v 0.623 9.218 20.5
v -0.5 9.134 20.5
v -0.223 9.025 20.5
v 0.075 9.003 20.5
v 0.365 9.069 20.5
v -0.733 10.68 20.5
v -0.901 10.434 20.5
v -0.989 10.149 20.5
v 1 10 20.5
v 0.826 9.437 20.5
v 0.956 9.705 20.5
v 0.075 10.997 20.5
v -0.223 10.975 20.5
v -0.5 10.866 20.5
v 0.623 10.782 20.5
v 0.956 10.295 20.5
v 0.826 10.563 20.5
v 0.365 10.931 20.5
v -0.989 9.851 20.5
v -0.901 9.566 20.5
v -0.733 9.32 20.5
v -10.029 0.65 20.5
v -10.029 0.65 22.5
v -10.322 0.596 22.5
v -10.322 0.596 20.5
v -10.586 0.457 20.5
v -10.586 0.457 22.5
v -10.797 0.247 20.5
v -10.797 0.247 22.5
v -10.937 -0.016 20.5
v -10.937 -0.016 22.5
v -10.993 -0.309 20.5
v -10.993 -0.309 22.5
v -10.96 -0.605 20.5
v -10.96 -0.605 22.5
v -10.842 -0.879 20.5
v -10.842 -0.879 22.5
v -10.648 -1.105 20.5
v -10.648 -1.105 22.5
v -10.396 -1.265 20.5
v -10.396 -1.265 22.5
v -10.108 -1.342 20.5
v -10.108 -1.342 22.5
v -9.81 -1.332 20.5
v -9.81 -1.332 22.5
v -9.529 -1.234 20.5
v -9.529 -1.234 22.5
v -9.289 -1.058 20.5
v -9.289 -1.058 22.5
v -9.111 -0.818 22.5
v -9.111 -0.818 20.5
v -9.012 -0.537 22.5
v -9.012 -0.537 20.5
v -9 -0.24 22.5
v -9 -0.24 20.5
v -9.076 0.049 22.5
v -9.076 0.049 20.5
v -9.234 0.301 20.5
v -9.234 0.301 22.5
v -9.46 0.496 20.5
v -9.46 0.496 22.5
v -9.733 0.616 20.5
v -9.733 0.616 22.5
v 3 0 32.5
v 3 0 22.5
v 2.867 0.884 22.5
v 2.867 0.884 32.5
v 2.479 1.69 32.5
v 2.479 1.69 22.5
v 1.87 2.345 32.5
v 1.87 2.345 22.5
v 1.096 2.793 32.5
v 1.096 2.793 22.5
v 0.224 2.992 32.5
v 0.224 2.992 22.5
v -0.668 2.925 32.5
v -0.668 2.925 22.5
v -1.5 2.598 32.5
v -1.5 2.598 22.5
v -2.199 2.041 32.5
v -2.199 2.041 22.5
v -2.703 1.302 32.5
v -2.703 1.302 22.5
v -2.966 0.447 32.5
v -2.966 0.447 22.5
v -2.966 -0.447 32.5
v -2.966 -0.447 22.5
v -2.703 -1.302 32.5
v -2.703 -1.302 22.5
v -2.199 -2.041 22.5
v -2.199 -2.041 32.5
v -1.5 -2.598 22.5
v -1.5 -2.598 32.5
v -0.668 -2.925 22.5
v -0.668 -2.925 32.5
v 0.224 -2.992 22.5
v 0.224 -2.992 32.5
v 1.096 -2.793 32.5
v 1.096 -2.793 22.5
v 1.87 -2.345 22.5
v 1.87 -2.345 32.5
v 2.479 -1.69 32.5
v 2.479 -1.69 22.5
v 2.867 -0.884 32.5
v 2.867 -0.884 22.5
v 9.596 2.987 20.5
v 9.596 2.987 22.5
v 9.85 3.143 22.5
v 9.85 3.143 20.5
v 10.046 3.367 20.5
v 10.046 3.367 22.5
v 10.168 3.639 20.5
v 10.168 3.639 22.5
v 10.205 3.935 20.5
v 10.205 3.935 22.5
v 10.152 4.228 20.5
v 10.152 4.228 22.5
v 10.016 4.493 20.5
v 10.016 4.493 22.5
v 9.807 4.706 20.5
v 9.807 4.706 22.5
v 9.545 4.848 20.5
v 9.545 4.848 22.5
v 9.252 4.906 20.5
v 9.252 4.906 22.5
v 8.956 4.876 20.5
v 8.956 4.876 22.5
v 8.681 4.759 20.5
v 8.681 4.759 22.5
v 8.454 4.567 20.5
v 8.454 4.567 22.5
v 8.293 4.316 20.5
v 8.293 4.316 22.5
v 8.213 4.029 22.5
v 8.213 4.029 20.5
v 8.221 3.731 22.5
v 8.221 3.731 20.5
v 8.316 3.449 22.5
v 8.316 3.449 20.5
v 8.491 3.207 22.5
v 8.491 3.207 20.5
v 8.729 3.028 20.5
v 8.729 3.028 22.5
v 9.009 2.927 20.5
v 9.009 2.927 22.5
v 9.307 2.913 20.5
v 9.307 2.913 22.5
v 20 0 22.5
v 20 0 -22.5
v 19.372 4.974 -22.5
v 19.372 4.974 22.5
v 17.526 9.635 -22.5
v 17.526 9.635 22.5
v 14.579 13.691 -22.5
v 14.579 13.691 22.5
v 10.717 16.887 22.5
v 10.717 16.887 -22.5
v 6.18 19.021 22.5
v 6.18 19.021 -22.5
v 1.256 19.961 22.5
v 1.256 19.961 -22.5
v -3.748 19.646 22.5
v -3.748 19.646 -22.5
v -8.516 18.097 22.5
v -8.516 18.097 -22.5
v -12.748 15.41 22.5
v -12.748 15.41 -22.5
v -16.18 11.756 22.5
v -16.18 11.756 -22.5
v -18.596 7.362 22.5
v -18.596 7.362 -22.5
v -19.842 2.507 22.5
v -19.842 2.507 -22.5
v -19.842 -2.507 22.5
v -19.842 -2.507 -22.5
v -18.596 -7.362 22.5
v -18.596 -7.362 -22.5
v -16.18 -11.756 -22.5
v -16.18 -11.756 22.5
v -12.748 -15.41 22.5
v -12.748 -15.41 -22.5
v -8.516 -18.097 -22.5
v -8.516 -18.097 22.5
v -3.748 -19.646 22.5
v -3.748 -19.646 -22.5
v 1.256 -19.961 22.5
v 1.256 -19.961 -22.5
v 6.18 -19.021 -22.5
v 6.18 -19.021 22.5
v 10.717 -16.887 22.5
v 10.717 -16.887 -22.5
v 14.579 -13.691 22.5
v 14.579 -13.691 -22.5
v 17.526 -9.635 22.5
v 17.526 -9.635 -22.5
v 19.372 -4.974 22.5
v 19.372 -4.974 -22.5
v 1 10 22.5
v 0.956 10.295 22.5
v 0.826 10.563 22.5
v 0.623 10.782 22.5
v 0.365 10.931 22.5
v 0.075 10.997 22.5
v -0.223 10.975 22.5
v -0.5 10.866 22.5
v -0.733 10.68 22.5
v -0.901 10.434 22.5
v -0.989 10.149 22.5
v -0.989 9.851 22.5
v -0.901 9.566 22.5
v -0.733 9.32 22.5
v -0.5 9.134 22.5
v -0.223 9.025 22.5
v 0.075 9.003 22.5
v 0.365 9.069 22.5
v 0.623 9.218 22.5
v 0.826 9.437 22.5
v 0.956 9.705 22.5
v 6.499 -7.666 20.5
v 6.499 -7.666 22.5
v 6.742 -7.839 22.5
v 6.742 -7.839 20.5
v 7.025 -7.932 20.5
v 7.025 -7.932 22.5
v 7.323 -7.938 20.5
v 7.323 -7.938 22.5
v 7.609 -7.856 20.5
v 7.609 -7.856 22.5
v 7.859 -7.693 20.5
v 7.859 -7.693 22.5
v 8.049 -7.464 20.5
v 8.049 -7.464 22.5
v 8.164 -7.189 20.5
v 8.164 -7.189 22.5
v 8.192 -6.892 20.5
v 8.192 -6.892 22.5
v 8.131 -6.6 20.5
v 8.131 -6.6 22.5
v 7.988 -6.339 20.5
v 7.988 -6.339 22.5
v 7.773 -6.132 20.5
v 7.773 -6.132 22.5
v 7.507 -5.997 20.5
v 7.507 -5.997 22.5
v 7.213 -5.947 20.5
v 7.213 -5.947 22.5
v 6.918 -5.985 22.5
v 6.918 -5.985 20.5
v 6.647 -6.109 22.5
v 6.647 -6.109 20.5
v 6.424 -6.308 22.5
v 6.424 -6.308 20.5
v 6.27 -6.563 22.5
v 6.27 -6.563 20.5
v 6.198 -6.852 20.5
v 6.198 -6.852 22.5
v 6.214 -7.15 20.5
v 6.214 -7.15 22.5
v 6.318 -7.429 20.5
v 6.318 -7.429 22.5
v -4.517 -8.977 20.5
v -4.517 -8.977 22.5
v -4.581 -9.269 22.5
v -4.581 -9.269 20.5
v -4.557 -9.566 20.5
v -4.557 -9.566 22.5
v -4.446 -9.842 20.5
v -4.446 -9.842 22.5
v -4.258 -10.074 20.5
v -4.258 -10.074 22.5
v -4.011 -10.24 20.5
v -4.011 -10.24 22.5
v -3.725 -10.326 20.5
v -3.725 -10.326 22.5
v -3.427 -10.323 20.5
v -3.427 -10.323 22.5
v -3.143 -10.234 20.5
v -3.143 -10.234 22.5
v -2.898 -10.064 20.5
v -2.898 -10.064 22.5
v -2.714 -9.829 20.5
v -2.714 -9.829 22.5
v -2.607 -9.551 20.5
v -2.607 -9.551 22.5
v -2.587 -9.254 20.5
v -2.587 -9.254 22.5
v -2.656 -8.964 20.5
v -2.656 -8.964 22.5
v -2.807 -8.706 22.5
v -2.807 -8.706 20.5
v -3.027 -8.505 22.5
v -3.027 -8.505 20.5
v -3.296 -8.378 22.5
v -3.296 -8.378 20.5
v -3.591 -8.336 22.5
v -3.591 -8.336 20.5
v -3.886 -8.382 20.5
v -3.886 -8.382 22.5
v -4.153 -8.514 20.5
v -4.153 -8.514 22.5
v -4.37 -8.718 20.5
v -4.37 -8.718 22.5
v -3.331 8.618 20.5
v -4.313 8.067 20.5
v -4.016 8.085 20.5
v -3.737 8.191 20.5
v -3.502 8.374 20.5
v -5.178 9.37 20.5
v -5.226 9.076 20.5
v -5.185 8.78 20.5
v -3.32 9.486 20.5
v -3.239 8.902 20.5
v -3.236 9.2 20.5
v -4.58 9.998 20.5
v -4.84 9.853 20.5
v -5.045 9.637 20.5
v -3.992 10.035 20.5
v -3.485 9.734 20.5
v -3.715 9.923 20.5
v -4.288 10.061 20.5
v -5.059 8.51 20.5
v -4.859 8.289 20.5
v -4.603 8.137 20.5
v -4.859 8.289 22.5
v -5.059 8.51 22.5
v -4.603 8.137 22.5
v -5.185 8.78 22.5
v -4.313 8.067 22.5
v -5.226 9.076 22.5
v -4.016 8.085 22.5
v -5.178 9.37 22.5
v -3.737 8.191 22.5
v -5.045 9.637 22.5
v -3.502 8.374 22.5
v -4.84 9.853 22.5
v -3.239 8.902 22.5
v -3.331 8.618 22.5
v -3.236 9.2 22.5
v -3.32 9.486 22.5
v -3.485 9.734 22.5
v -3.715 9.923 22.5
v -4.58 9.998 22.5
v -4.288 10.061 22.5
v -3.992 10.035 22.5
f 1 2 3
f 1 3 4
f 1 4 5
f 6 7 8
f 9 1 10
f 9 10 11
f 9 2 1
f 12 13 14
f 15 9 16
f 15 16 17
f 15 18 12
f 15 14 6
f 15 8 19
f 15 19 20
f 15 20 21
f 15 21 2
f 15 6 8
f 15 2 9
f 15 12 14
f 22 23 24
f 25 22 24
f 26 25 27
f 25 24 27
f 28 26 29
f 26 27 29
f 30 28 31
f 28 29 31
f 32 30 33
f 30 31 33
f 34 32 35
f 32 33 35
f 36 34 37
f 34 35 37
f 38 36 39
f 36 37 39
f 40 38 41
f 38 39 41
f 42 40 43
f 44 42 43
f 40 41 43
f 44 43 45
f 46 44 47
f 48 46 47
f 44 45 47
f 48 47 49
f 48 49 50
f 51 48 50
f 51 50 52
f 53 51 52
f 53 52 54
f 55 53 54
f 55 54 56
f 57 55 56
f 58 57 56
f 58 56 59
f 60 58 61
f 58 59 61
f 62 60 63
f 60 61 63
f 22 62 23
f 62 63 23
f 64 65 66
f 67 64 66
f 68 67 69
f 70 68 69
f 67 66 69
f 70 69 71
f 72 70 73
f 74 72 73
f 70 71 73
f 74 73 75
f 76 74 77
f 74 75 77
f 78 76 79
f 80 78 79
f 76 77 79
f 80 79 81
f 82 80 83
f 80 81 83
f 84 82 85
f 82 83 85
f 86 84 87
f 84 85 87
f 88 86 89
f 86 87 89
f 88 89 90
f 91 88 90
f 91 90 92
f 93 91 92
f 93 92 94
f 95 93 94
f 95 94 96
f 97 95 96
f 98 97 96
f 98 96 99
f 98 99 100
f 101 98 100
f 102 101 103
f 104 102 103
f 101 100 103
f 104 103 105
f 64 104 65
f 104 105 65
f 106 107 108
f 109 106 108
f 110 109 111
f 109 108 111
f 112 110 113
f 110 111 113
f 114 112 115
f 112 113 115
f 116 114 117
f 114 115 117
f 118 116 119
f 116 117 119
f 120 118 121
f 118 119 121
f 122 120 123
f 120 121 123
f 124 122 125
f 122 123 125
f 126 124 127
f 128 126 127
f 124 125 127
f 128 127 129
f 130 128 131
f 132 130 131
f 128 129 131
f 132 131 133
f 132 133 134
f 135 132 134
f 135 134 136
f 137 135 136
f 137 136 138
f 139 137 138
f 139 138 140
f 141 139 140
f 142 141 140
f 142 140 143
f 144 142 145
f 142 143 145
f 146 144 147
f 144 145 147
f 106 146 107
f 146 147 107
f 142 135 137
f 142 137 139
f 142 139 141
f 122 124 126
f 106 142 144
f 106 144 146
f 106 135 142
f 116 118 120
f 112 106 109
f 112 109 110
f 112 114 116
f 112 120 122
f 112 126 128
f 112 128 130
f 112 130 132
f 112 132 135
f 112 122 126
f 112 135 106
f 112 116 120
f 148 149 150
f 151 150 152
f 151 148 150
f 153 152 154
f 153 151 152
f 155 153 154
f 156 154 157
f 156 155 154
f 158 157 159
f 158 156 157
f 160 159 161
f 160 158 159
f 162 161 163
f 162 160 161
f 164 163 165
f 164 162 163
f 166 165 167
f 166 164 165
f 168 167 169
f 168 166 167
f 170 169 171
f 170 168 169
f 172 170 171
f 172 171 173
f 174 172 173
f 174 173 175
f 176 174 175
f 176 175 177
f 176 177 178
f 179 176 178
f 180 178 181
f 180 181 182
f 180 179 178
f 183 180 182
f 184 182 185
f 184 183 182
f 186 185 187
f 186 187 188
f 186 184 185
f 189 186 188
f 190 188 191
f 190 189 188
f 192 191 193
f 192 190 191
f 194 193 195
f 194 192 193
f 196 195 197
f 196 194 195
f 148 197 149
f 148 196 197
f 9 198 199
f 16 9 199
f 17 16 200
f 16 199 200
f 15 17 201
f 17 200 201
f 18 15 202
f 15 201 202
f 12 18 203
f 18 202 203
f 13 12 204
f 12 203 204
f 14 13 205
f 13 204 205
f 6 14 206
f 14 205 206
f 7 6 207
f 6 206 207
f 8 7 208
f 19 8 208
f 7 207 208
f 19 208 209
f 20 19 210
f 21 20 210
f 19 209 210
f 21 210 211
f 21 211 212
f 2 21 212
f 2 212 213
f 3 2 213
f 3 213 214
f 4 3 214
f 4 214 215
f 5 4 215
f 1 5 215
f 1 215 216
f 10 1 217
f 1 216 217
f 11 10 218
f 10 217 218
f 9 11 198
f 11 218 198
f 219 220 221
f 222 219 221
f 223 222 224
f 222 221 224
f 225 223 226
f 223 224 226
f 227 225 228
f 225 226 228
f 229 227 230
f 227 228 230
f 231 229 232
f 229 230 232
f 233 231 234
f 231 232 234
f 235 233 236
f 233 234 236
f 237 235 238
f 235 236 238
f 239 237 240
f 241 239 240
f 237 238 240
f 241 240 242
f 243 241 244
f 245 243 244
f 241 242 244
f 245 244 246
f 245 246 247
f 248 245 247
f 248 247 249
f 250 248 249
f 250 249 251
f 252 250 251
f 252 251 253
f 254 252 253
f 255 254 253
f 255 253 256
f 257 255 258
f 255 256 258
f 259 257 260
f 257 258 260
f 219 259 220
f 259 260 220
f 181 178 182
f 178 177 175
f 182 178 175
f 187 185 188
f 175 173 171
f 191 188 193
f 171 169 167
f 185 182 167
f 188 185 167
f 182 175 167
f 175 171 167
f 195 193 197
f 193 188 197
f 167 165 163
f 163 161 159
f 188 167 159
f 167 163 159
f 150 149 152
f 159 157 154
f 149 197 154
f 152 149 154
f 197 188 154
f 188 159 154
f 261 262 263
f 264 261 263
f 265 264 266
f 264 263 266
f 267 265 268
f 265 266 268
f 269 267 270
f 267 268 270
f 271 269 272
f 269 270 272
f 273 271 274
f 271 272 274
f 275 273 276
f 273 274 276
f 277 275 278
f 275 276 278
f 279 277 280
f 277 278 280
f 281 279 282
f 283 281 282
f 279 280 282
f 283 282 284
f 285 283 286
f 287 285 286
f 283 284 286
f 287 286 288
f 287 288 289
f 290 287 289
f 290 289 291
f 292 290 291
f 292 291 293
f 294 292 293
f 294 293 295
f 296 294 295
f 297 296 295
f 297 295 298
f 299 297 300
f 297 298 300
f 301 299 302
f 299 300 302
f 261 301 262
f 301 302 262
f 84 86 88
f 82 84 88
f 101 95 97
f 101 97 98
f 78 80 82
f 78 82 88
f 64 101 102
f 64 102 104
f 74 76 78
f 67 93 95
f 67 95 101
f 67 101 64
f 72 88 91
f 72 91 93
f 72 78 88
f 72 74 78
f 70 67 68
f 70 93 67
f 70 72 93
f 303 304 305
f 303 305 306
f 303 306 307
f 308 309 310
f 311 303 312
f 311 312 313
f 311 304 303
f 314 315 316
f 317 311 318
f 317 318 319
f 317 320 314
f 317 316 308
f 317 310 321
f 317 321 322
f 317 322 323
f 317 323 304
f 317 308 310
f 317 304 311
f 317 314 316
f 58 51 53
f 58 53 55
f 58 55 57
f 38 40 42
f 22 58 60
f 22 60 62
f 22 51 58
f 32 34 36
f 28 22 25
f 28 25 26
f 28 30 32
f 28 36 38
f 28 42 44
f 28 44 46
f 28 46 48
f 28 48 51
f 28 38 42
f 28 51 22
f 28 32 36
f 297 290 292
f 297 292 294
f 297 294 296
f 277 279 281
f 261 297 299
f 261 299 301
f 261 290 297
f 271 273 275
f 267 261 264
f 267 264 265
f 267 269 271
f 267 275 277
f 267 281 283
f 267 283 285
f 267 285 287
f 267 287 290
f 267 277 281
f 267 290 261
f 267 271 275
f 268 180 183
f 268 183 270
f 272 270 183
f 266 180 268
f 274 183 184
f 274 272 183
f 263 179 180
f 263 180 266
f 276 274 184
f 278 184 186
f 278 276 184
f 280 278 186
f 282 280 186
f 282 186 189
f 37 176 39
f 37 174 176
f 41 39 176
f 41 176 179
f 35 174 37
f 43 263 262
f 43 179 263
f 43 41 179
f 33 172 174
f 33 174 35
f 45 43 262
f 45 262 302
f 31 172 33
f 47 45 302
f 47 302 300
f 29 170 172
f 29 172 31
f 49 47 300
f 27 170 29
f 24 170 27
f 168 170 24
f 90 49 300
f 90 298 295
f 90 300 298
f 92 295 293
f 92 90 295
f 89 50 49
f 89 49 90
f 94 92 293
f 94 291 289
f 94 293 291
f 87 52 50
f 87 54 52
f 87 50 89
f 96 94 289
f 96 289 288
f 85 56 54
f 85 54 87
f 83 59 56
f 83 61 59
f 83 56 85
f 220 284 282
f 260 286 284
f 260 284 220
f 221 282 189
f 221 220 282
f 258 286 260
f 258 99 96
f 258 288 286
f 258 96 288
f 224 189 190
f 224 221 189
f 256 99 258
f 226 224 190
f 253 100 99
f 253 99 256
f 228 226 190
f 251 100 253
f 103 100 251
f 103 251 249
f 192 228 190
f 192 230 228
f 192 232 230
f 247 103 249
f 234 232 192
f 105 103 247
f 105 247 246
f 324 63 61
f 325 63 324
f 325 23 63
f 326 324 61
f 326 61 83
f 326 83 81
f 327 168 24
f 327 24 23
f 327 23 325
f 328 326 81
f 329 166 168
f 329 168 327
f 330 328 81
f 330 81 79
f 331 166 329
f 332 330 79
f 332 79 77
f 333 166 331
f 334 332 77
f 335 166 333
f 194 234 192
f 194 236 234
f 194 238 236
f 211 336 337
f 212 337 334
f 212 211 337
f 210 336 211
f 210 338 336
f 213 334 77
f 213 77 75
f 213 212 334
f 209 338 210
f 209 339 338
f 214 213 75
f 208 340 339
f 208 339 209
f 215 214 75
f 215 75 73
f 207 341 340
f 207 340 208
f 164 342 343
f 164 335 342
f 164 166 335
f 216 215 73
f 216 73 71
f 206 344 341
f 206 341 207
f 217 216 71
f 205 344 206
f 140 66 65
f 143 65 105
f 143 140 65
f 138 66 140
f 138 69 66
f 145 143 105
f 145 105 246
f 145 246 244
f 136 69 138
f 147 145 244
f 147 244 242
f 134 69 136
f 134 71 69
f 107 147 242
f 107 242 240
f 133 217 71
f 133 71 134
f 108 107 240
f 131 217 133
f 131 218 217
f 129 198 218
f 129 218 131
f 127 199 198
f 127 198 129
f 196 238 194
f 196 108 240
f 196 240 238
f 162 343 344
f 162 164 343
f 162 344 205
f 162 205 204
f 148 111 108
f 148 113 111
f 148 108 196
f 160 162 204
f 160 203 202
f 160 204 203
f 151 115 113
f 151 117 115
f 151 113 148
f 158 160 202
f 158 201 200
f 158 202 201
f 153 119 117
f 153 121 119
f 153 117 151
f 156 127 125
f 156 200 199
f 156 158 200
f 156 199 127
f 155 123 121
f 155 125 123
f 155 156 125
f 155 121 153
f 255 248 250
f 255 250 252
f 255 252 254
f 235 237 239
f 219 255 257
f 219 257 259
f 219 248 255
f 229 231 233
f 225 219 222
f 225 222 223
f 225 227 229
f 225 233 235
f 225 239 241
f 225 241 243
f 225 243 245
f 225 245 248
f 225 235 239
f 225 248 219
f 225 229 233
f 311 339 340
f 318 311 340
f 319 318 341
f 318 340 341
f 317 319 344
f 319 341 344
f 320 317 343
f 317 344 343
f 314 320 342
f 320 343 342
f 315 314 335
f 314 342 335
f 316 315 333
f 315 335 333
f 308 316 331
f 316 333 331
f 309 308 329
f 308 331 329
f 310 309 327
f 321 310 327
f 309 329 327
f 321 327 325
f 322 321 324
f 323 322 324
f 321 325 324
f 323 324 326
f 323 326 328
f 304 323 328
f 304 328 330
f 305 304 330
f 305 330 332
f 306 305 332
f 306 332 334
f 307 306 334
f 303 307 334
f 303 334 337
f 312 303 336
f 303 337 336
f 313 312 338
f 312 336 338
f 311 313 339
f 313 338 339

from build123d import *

# Parameters (mm, degrees)
SKETCH1_R           = 20
BOSS_EXTRUDE1_DEPTH = 22.5
SKETCH2_R           = 3
BOSS_EXTRUDE2_DEPTH = 10
SKETCH3_R           = 1
CUT_EXTRUDE1_DEPTH  = 2
CIRPATTERN1_COUNT   = 6
CIRPATTERN1_ANGLE   = 335


with BuildPart() as part:
    # Sketch1 → Boss-Extrude1 (new body, symmetric)
    with BuildSketch(Plane.XY):
        Circle(SKETCH1_R)
    extrude(amount=BOSS_EXTRUDE1_DEPTH, both=True)

    # Sketch2 → Boss-Extrude2 (add)
    with BuildSketch(Plane.XY.offset(22.5)):
        Circle(SKETCH2_R)
    extrude(amount=BOSS_EXTRUDE2_DEPTH)

    # Sketch3 → Cut-Extrude1 (cut)
    with BuildSketch(Plane.XY.offset(22.5)):
        with Locations((0, 10)):
            Circle(SKETCH3_R)
    cut_extrude1 = extrude(amount=-CUT_EXTRUDE1_DEPTH, mode=Mode.SUBTRACT)

    # CirPattern1: Cut-Extrude1 ×6 about axis
    cirpattern1_axis = Axis((0, 0, 0), (0, 0, -1))
    for i in range(1, CIRPATTERN1_COUNT):
        add(cut_extrude1.rotate(cirpattern1_axis, i * CIRPATTERN1_ANGLE / (CIRPATTERN1_COUNT - 1)), mode=Mode.SUBTRACT)


solid = part.part
